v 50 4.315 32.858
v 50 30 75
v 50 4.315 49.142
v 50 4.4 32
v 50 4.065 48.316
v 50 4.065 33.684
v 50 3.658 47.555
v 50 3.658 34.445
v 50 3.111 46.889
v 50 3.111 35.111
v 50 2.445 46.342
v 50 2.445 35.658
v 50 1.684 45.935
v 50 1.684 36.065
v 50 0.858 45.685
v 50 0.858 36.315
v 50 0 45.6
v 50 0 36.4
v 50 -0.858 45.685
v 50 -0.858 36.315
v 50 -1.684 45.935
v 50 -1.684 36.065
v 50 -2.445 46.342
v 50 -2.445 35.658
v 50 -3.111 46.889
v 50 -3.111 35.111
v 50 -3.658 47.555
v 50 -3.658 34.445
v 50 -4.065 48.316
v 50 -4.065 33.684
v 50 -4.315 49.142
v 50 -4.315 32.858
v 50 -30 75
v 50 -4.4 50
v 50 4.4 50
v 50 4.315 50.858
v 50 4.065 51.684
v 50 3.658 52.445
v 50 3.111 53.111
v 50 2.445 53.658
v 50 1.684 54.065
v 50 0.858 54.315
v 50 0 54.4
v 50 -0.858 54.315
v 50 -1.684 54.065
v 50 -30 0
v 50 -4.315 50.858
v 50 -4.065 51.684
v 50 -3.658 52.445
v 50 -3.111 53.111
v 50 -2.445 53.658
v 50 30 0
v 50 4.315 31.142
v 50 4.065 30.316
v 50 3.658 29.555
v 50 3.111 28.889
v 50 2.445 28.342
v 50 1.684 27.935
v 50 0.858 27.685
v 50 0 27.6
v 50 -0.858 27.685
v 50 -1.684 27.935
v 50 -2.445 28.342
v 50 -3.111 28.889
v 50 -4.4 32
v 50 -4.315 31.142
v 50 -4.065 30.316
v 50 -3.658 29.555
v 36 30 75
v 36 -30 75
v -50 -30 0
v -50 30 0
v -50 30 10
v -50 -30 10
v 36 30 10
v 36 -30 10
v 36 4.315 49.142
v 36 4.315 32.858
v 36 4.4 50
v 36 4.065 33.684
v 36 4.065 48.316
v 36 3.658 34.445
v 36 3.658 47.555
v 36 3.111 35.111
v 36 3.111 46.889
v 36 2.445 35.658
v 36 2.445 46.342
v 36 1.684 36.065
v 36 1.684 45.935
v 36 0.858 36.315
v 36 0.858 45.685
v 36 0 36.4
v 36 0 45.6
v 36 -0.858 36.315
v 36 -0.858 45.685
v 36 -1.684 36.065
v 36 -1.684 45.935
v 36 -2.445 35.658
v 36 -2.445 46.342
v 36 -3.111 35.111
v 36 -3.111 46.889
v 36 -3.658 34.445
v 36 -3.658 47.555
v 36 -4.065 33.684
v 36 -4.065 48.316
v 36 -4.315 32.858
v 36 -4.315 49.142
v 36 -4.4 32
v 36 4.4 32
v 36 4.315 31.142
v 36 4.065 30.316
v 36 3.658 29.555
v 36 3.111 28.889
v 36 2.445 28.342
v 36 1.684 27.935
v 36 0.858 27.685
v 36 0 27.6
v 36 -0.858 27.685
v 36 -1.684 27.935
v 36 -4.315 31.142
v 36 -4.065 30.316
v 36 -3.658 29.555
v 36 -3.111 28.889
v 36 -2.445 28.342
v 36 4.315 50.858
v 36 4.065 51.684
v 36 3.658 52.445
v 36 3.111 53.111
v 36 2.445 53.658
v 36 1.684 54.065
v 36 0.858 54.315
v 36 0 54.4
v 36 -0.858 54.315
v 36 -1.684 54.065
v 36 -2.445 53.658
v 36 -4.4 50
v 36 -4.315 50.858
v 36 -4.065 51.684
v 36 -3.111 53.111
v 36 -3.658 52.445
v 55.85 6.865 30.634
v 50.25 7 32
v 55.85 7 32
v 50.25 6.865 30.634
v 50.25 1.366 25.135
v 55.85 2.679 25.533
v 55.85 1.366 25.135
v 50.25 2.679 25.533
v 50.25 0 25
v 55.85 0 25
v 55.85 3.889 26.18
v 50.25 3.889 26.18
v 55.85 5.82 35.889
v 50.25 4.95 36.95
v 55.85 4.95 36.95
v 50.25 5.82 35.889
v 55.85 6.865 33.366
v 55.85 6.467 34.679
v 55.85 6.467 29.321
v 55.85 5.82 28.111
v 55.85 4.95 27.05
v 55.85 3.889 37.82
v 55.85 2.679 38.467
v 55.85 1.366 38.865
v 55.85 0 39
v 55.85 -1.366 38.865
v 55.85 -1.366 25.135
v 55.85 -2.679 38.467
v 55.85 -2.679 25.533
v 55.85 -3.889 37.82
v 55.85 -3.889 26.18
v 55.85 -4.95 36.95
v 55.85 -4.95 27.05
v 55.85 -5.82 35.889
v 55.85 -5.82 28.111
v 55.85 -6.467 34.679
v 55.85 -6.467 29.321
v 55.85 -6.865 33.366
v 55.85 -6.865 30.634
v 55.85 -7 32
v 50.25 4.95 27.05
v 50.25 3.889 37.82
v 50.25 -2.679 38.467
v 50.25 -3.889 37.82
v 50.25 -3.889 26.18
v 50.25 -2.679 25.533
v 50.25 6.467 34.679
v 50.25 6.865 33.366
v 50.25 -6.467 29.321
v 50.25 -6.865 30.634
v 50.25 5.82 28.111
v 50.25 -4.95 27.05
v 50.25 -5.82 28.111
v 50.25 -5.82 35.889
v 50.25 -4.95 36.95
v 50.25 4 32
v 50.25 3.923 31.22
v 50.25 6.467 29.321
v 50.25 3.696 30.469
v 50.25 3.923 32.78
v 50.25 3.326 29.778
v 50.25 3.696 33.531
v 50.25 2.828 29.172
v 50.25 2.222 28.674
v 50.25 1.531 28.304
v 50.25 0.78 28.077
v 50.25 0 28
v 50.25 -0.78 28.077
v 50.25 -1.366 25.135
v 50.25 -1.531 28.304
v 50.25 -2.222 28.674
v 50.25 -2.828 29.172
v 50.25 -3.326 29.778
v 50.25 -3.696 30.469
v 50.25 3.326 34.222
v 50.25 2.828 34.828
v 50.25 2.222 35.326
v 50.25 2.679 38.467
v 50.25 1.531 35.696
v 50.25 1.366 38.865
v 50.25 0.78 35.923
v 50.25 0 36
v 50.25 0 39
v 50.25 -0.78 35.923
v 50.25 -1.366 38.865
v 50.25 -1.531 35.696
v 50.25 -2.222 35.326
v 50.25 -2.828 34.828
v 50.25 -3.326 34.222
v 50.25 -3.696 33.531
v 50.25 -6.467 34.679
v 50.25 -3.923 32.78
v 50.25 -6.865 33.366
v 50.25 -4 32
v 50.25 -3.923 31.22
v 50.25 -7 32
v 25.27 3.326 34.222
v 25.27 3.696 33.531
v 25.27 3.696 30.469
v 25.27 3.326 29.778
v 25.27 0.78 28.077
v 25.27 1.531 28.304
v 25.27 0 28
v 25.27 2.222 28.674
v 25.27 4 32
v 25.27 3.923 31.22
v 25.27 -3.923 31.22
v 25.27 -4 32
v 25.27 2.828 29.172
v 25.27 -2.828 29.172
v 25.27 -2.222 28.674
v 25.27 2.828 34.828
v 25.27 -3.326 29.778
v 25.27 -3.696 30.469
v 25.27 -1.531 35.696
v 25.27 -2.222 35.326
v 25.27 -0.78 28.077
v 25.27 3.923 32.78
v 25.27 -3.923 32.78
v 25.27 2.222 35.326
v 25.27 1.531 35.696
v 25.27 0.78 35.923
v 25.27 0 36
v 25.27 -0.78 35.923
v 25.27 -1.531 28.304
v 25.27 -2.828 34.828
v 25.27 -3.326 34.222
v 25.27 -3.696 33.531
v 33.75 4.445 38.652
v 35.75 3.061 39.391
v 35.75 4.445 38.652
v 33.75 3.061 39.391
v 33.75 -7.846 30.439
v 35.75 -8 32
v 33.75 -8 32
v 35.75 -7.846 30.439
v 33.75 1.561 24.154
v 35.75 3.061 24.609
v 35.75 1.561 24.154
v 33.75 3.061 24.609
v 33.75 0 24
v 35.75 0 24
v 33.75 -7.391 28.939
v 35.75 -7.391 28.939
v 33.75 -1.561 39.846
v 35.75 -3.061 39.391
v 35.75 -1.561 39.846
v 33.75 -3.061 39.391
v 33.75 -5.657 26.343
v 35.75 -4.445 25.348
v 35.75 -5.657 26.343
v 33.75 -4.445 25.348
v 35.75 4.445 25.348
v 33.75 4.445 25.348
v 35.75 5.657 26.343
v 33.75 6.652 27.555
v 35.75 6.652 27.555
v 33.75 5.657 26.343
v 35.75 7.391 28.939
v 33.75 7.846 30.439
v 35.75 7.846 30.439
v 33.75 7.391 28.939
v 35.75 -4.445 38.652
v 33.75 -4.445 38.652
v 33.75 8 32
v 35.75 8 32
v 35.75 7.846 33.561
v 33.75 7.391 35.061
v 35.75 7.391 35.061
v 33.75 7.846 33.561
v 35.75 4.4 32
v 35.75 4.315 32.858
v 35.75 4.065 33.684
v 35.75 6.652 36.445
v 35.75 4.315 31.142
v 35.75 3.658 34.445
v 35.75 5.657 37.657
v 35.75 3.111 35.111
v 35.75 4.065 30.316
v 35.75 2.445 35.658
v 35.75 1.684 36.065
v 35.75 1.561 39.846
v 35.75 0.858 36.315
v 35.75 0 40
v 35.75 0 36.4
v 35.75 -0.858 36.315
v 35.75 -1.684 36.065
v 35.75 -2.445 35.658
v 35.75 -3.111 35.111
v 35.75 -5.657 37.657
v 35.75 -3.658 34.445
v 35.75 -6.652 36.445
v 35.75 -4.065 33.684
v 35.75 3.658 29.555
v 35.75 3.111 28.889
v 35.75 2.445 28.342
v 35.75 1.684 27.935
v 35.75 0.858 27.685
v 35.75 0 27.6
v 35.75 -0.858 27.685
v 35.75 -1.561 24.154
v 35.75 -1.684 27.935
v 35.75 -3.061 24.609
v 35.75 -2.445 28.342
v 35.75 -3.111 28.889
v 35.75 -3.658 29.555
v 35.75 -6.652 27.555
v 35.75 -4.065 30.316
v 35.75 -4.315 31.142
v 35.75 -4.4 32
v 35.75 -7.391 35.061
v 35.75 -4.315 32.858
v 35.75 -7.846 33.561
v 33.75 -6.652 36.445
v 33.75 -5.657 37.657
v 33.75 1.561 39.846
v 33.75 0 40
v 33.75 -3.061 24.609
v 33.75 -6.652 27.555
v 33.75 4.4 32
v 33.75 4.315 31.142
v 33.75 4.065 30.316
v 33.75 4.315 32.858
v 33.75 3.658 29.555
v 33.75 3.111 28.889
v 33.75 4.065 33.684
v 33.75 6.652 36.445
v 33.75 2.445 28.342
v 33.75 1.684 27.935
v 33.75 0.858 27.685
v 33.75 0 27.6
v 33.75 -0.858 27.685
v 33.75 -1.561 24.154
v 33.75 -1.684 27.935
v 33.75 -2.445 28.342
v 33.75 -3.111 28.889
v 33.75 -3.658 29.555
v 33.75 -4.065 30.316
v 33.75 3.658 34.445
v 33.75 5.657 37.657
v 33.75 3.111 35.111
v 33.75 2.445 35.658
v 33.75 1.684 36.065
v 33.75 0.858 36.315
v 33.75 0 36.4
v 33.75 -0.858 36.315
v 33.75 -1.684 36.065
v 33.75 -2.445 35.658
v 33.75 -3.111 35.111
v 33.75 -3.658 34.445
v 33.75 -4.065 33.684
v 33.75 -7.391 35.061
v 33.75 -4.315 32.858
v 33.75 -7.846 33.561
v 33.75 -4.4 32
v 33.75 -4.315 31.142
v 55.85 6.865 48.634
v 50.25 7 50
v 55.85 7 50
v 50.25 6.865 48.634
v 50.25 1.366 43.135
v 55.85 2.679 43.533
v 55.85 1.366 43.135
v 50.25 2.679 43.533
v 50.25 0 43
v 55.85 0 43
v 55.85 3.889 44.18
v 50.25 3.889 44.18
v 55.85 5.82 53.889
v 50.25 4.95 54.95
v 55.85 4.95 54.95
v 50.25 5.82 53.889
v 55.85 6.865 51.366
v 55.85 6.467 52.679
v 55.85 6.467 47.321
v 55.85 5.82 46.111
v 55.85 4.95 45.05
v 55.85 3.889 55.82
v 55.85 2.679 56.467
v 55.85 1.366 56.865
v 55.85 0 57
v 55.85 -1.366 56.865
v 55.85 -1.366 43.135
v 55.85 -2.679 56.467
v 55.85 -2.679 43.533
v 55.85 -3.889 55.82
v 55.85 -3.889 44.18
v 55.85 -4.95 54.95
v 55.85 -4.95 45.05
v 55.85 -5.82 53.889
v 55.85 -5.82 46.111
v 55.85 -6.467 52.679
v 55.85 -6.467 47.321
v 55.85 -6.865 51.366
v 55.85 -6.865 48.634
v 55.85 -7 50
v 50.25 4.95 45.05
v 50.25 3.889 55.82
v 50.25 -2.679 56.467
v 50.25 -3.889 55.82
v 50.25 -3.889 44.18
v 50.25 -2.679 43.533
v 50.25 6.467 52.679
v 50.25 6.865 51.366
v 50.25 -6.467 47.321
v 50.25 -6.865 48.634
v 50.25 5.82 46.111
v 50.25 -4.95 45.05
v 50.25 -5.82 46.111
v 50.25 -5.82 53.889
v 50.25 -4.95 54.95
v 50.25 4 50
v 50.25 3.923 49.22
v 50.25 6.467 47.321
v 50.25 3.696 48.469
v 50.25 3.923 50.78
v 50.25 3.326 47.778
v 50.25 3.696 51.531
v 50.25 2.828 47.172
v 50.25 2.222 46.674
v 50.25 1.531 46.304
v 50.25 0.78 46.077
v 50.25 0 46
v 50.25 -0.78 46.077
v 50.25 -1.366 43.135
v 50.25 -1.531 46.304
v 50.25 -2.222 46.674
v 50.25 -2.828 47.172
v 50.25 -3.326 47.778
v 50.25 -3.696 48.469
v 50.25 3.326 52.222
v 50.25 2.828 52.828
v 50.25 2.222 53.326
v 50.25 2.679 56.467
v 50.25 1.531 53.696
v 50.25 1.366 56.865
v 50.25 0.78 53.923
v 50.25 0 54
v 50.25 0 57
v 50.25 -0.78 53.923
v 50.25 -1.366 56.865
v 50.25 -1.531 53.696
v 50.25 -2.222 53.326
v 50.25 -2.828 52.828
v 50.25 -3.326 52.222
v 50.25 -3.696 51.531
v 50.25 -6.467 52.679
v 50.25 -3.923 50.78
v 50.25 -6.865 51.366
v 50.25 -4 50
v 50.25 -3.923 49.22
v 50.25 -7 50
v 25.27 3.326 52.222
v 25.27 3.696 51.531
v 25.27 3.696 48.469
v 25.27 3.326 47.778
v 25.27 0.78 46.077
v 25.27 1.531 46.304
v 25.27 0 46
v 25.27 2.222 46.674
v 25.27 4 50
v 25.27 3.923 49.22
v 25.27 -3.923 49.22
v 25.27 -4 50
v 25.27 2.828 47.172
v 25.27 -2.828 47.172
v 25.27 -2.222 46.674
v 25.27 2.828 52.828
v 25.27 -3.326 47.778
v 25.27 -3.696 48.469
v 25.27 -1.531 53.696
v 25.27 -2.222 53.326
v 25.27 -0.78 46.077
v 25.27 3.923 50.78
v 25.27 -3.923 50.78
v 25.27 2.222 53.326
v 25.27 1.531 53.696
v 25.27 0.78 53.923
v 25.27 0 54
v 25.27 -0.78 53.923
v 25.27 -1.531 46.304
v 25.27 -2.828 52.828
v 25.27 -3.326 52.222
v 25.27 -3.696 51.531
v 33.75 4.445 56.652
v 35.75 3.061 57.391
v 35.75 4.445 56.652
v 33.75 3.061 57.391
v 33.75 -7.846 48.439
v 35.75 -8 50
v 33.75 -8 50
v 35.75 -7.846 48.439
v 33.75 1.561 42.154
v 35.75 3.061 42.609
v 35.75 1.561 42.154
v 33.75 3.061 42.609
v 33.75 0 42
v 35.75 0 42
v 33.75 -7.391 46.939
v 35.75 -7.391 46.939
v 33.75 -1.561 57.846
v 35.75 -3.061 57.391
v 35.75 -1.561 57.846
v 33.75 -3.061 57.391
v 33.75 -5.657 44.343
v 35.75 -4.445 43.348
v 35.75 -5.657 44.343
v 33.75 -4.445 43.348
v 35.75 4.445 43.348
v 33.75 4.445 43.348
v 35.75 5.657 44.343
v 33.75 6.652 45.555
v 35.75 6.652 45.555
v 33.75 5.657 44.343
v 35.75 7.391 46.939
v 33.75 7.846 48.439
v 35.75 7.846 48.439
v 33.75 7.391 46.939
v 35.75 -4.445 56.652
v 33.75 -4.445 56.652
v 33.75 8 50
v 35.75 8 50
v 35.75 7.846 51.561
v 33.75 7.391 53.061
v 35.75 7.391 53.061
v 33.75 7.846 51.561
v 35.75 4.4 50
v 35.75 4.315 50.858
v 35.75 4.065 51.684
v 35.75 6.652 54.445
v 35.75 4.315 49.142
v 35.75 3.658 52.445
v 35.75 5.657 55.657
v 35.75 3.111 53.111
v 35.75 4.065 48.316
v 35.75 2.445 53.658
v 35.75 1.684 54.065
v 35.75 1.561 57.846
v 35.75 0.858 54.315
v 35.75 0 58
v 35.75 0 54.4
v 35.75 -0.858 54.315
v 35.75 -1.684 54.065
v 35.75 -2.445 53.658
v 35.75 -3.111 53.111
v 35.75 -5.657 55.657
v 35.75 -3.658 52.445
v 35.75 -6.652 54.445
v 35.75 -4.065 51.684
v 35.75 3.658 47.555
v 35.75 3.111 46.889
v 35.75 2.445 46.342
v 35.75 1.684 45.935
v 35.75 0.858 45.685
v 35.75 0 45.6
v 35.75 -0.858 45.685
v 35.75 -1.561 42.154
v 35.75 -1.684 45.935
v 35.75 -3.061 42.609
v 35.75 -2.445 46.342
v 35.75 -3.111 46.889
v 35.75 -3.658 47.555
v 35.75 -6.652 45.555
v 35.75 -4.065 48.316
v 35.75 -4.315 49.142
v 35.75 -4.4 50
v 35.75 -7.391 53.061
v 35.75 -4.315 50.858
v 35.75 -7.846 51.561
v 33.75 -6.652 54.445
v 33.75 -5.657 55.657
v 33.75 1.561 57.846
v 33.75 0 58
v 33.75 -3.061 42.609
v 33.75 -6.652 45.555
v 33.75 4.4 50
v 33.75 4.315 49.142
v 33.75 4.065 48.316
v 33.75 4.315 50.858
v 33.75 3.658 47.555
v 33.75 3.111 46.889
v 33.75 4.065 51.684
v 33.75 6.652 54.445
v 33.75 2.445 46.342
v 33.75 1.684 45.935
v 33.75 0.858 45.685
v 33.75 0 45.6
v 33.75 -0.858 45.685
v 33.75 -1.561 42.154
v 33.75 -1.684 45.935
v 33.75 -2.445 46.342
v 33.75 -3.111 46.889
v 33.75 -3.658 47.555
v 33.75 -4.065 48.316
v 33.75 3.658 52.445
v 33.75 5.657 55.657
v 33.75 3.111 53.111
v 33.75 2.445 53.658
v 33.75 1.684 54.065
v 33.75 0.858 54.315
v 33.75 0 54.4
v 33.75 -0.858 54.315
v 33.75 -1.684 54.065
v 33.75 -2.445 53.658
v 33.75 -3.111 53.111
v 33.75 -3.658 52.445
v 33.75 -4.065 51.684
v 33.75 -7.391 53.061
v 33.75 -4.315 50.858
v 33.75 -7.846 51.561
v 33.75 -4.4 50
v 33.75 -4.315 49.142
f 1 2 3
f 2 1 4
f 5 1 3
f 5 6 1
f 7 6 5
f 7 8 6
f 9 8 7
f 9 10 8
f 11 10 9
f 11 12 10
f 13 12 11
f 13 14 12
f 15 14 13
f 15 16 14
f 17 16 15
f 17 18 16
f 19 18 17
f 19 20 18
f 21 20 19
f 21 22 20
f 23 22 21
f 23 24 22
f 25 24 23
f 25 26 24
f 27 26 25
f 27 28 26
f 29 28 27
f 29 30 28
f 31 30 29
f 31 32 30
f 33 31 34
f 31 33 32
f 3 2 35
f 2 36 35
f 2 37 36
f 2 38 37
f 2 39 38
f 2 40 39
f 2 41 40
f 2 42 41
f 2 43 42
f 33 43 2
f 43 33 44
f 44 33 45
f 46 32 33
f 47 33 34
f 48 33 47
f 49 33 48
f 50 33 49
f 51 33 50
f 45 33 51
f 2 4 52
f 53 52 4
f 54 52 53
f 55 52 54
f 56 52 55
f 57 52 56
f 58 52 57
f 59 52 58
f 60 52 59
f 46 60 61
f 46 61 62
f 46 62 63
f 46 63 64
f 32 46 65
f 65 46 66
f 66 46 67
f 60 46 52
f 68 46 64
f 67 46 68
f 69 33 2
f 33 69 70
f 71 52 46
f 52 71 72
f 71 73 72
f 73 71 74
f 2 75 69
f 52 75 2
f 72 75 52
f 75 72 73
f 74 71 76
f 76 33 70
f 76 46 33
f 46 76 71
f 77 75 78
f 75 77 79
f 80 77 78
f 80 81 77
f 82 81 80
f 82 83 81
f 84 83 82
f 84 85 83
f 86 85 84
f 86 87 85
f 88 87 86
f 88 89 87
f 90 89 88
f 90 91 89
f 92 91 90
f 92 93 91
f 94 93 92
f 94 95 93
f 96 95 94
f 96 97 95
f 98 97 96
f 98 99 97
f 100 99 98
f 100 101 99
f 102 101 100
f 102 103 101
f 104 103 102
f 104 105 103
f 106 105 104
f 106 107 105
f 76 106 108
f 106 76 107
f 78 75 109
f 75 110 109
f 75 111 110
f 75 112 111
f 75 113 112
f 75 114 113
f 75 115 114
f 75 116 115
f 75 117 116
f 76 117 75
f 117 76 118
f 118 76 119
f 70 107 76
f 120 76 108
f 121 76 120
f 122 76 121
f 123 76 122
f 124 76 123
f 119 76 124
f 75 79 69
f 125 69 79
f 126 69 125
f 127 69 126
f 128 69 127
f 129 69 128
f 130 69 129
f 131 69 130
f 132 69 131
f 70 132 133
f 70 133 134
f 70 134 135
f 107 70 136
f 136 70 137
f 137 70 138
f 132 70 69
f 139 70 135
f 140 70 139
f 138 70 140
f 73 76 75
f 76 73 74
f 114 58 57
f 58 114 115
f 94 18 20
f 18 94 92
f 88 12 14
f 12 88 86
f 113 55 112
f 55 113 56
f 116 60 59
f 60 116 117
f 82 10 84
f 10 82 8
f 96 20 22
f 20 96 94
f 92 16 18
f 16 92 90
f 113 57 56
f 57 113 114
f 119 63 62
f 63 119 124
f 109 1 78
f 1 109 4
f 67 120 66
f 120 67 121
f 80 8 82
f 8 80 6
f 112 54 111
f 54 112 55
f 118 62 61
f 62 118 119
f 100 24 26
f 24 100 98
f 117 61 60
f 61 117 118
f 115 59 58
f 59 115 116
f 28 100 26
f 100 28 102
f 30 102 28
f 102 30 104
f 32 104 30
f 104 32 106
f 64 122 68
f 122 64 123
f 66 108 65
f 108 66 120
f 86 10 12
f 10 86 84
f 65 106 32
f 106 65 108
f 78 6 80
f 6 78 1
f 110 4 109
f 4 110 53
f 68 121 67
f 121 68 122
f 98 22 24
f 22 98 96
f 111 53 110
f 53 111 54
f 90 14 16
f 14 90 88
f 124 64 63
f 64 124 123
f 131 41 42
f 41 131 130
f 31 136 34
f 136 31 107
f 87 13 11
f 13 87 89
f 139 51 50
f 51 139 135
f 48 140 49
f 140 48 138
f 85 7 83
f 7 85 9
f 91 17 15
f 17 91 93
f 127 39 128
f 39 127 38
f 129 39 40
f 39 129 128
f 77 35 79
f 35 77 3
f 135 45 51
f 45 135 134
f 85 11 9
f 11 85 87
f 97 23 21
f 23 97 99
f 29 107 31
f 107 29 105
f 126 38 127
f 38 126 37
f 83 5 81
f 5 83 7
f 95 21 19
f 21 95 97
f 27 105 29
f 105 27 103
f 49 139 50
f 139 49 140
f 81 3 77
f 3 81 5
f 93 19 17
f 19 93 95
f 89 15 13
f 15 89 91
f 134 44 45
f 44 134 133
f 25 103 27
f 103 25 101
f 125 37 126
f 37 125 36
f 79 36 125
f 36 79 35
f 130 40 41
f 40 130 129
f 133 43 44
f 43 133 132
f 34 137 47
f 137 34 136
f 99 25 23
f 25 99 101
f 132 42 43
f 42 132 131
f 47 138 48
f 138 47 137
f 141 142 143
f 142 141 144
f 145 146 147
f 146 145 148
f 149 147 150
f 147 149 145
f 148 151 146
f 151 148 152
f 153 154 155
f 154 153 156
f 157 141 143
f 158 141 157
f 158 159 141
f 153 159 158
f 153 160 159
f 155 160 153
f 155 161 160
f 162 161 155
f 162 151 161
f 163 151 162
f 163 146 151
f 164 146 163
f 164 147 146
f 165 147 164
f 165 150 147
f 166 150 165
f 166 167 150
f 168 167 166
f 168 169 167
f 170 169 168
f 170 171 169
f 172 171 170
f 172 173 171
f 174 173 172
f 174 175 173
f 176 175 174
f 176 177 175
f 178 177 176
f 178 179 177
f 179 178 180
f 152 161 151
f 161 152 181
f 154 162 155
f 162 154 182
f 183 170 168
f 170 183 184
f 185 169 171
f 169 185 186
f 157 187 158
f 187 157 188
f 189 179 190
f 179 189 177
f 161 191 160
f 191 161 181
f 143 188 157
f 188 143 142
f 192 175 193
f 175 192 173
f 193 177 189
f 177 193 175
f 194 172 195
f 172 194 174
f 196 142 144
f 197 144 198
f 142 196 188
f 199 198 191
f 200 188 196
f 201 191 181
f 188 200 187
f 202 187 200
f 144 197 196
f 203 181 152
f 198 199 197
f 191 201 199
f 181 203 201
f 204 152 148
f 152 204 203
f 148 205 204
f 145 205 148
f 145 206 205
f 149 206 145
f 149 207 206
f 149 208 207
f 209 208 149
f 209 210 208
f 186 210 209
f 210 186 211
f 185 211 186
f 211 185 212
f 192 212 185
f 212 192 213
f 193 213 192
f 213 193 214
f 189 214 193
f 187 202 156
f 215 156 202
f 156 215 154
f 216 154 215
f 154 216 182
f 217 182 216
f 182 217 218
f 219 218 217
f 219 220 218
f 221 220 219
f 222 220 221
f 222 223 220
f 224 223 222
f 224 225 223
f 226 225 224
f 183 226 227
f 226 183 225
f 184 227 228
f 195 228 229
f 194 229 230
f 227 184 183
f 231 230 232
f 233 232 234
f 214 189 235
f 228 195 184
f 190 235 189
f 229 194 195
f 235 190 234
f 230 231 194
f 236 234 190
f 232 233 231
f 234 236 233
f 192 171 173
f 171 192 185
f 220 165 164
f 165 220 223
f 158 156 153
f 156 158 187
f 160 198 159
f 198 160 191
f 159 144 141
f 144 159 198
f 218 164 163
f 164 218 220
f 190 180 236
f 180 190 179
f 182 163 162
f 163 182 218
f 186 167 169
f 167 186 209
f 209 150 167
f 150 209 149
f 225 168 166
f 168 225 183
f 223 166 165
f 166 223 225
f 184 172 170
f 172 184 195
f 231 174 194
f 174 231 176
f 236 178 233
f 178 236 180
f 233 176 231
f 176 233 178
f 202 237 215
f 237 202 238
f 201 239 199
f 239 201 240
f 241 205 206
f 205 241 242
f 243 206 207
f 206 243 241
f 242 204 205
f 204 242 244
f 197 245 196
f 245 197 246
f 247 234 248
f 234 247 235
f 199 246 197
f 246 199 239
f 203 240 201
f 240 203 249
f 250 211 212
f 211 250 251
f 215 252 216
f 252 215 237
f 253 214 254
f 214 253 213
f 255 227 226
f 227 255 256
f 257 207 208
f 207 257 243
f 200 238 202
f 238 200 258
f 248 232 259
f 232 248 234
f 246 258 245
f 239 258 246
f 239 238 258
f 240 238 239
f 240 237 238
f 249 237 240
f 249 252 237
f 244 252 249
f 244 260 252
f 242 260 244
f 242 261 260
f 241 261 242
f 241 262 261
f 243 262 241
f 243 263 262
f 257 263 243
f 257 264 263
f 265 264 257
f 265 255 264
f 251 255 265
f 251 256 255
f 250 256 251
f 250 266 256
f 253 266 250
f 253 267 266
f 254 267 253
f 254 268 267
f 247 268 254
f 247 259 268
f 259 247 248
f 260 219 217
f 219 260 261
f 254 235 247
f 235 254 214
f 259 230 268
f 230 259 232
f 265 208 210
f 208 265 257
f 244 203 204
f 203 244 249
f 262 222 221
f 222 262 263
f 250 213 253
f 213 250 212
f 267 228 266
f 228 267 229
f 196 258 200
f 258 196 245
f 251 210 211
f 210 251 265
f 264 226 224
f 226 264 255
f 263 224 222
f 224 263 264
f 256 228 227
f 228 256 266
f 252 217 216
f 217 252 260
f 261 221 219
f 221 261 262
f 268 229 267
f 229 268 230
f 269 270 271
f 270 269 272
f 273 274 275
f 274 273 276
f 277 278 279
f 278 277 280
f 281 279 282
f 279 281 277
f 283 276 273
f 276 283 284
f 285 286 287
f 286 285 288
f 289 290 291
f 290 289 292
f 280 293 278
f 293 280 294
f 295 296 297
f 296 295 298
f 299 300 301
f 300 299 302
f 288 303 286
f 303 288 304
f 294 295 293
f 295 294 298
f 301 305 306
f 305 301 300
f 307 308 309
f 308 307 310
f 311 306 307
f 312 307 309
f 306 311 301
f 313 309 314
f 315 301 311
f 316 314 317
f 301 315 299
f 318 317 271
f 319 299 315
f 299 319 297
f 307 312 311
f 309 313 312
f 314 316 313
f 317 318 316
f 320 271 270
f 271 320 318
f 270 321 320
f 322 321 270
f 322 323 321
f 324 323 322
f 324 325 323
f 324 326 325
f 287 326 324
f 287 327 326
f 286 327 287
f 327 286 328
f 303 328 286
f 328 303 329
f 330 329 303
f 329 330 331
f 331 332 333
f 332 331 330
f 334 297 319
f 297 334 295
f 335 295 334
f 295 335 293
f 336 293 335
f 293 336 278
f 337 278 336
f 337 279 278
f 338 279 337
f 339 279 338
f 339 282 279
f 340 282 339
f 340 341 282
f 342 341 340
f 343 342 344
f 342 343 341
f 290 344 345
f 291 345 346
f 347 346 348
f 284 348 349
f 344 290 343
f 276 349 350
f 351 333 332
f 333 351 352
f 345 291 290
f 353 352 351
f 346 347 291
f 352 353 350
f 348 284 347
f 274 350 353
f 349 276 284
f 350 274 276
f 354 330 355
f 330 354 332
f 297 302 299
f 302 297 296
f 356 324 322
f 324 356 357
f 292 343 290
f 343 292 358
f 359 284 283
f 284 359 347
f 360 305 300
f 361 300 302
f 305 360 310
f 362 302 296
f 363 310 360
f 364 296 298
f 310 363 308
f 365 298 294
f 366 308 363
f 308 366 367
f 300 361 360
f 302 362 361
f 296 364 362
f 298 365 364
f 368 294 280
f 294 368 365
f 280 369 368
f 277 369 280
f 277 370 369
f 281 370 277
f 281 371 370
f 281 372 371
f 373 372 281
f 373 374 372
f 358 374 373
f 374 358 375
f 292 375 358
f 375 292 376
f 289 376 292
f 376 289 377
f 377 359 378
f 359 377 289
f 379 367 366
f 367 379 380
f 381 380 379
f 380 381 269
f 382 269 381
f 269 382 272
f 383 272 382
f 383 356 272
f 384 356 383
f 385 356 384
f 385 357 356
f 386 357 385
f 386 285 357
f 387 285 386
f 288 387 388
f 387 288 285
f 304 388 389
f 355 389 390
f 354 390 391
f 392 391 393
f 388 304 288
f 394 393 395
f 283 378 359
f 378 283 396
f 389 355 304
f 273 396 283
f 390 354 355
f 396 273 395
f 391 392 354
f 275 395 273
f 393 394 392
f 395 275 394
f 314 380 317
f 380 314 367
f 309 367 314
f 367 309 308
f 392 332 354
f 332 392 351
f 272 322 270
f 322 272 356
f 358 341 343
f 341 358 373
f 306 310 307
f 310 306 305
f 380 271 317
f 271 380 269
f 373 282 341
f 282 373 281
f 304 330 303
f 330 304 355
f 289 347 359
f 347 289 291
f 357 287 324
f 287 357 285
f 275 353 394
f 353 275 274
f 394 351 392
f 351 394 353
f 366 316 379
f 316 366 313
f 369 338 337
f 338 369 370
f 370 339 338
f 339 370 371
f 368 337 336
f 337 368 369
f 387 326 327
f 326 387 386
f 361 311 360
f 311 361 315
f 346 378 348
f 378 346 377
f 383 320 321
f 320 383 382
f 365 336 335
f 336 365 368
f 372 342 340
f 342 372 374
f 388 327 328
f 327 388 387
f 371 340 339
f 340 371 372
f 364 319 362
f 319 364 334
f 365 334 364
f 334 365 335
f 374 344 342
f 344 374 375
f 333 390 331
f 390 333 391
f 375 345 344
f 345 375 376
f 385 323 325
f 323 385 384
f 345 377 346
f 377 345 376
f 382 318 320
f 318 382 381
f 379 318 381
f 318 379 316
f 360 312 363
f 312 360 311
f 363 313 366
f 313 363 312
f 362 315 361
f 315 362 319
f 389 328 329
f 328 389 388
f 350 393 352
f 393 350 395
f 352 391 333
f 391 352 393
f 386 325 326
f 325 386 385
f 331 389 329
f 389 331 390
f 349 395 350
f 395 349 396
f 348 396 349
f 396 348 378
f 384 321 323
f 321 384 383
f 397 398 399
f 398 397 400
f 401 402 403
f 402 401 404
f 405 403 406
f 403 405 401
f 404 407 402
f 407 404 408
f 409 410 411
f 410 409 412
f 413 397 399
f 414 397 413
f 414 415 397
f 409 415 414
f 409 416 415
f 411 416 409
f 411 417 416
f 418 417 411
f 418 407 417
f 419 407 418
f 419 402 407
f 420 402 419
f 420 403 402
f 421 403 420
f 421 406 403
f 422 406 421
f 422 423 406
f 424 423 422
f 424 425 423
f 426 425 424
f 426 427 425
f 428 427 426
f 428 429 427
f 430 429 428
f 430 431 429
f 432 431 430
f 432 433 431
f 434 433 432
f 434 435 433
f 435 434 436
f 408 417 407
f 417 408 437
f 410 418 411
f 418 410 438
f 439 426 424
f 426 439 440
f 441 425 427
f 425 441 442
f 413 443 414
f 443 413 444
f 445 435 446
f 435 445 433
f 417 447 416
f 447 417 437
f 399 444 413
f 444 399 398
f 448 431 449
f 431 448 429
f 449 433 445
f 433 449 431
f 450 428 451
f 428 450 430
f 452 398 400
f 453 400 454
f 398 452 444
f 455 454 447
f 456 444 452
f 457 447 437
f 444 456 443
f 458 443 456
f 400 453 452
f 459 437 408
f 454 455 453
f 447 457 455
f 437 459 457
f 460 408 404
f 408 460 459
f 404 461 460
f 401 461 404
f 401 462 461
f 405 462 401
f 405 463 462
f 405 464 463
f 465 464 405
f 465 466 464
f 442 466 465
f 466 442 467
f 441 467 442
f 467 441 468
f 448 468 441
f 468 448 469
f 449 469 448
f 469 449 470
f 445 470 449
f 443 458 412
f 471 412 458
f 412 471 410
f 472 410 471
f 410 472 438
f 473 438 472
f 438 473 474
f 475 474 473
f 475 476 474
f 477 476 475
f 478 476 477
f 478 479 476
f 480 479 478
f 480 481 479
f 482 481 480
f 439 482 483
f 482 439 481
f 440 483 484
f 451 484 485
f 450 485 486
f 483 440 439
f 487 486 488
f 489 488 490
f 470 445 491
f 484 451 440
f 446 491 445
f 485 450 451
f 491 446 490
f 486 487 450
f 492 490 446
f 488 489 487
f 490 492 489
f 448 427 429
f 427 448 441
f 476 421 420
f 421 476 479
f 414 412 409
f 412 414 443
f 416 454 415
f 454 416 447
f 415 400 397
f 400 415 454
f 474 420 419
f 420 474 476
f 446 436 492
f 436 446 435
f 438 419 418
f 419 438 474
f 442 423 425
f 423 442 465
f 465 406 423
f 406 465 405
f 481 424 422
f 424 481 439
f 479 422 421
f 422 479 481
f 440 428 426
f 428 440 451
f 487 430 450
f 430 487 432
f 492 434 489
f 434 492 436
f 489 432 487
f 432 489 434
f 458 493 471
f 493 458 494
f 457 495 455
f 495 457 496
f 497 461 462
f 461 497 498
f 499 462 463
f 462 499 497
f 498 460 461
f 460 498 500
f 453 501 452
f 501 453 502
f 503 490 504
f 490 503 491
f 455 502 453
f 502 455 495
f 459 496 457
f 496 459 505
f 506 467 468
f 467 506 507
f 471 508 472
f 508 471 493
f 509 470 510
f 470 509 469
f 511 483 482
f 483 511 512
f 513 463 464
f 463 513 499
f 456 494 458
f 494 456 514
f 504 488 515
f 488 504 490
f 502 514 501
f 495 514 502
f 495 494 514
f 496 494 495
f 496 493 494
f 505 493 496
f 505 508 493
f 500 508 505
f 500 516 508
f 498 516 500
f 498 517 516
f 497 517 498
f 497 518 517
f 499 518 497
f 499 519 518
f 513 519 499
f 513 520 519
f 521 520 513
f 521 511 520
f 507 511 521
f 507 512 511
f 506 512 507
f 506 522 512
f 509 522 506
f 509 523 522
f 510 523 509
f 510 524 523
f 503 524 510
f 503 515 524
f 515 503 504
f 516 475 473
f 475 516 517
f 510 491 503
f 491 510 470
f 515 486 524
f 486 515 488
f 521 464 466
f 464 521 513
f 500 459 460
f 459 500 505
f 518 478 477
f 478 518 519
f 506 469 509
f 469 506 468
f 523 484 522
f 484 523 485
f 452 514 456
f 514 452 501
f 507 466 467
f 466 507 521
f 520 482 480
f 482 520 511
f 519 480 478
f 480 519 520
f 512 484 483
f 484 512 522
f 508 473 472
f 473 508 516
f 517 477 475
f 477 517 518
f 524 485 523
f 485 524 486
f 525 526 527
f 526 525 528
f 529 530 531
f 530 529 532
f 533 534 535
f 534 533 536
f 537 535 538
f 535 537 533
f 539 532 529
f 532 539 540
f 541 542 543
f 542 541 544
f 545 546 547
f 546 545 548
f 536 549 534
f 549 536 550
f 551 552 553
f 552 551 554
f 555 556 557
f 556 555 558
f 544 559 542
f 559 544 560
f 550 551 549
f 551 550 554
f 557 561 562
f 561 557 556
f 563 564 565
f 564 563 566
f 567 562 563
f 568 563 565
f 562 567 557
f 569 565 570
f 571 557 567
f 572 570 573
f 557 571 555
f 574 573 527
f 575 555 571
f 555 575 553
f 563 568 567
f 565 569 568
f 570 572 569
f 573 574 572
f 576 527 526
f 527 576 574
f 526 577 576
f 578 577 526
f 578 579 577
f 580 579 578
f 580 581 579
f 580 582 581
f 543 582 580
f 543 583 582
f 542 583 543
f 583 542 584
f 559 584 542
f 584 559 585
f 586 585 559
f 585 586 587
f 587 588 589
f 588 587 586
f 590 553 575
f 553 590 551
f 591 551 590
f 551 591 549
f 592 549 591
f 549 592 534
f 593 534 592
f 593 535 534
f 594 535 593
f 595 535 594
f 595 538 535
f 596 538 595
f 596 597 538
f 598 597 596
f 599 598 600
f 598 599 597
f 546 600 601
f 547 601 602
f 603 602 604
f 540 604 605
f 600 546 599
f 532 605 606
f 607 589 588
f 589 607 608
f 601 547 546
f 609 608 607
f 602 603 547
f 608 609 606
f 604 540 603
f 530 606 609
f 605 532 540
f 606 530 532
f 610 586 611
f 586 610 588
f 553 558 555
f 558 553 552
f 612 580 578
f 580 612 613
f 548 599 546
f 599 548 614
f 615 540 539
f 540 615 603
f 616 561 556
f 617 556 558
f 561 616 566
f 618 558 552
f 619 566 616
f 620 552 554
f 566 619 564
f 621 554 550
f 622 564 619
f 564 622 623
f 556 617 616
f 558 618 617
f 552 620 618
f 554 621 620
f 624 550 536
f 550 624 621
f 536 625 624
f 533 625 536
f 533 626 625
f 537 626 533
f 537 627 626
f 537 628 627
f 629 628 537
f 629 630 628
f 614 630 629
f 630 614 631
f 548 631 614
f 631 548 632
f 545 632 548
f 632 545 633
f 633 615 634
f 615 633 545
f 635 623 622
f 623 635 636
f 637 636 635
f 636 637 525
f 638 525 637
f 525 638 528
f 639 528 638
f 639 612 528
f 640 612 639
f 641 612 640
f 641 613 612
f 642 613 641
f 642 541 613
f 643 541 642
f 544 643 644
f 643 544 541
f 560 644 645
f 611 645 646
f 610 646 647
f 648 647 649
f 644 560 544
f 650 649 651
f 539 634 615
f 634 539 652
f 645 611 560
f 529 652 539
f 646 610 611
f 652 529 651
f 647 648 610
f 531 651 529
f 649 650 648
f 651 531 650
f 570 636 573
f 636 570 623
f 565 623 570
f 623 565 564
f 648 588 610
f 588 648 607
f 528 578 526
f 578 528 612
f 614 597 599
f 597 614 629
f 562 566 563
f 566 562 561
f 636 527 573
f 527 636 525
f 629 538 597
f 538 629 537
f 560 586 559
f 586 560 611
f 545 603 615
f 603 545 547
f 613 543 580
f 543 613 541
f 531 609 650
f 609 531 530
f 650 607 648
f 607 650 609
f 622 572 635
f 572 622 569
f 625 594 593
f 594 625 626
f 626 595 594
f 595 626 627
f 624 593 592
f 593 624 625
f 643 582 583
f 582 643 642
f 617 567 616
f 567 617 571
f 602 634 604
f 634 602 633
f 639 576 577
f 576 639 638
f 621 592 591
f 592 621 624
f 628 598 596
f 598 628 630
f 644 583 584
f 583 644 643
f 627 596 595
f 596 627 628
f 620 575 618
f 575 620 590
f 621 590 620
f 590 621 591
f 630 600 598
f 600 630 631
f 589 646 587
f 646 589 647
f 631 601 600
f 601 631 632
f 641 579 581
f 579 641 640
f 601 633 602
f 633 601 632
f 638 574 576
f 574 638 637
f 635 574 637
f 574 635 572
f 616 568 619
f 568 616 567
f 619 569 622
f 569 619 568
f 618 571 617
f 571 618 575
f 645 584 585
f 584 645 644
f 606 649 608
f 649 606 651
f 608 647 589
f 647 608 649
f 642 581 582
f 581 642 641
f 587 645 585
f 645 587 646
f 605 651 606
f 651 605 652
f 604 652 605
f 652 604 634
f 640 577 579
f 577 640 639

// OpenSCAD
$fn = 32;

// ------------------------------------------------------------------------
// Bolted bracket: 100 x 60 mm bracket with 2 bolt joints
// Every part is its own module, assembly() places them once.
// ------------------------------------------------------------------------

// --- part 1 ---
module bracket() {
  difference() {
    translate([-50, -30, 0]) cube([100, 60, 75]);
    translate([-51, -31, 10]) cube([87, 62, 66]);
    translate([43, 0, 32]) rotate([0, 90, 0]) cylinder(h = 16, d = 8.8, center = true);
    translate([43, 0, 50]) rotate([0, 90, 0]) cylinder(h = 16, d = 8.8, center = true);
  }
}

// --- part 2 ---
module bolt1() {
  cylinder(h = 5.6, d = 14);
  translate([0, 0, -24.98]) cylinder(h = 24.98, d = 8);
}

// --- part 3 ---
module washer1() {
  difference() {
      translate([0, 0, 0]) cylinder(h = 2, d = 16);
      translate([0, 0, -1]) cylinder(h = 4, d = 8.8);
    }
}

// --- part 4 ---
module bolt2() {
  cylinder(h = 5.6, d = 14);
  translate([0, 0, -24.98]) cylinder(h = 24.98, d = 8);
}

// --- part 5 ---
module washer2() {
  difference() {
      translate([0, 0, 0]) cylinder(h = 2, d = 16);
      translate([0, 0, -1]) cylinder(h = 4, d = 8.8);
    }
}

// --- assembly ---
module assembly() {
  translate([0, 0, 0]) rotate([0, 0, 0]) bracket();
  translate([50.25, 0, 32]) rotate([0, 90, 0]) bolt1();
  translate([33.75, 0, 32]) rotate([0, 90, 0]) washer1();
  translate([50.25, 0, 50]) rotate([0, 90, 0]) bolt2();
  translate([33.75, 0, 50]) rotate([0, 90, 0]) washer2();
}

assembly();
